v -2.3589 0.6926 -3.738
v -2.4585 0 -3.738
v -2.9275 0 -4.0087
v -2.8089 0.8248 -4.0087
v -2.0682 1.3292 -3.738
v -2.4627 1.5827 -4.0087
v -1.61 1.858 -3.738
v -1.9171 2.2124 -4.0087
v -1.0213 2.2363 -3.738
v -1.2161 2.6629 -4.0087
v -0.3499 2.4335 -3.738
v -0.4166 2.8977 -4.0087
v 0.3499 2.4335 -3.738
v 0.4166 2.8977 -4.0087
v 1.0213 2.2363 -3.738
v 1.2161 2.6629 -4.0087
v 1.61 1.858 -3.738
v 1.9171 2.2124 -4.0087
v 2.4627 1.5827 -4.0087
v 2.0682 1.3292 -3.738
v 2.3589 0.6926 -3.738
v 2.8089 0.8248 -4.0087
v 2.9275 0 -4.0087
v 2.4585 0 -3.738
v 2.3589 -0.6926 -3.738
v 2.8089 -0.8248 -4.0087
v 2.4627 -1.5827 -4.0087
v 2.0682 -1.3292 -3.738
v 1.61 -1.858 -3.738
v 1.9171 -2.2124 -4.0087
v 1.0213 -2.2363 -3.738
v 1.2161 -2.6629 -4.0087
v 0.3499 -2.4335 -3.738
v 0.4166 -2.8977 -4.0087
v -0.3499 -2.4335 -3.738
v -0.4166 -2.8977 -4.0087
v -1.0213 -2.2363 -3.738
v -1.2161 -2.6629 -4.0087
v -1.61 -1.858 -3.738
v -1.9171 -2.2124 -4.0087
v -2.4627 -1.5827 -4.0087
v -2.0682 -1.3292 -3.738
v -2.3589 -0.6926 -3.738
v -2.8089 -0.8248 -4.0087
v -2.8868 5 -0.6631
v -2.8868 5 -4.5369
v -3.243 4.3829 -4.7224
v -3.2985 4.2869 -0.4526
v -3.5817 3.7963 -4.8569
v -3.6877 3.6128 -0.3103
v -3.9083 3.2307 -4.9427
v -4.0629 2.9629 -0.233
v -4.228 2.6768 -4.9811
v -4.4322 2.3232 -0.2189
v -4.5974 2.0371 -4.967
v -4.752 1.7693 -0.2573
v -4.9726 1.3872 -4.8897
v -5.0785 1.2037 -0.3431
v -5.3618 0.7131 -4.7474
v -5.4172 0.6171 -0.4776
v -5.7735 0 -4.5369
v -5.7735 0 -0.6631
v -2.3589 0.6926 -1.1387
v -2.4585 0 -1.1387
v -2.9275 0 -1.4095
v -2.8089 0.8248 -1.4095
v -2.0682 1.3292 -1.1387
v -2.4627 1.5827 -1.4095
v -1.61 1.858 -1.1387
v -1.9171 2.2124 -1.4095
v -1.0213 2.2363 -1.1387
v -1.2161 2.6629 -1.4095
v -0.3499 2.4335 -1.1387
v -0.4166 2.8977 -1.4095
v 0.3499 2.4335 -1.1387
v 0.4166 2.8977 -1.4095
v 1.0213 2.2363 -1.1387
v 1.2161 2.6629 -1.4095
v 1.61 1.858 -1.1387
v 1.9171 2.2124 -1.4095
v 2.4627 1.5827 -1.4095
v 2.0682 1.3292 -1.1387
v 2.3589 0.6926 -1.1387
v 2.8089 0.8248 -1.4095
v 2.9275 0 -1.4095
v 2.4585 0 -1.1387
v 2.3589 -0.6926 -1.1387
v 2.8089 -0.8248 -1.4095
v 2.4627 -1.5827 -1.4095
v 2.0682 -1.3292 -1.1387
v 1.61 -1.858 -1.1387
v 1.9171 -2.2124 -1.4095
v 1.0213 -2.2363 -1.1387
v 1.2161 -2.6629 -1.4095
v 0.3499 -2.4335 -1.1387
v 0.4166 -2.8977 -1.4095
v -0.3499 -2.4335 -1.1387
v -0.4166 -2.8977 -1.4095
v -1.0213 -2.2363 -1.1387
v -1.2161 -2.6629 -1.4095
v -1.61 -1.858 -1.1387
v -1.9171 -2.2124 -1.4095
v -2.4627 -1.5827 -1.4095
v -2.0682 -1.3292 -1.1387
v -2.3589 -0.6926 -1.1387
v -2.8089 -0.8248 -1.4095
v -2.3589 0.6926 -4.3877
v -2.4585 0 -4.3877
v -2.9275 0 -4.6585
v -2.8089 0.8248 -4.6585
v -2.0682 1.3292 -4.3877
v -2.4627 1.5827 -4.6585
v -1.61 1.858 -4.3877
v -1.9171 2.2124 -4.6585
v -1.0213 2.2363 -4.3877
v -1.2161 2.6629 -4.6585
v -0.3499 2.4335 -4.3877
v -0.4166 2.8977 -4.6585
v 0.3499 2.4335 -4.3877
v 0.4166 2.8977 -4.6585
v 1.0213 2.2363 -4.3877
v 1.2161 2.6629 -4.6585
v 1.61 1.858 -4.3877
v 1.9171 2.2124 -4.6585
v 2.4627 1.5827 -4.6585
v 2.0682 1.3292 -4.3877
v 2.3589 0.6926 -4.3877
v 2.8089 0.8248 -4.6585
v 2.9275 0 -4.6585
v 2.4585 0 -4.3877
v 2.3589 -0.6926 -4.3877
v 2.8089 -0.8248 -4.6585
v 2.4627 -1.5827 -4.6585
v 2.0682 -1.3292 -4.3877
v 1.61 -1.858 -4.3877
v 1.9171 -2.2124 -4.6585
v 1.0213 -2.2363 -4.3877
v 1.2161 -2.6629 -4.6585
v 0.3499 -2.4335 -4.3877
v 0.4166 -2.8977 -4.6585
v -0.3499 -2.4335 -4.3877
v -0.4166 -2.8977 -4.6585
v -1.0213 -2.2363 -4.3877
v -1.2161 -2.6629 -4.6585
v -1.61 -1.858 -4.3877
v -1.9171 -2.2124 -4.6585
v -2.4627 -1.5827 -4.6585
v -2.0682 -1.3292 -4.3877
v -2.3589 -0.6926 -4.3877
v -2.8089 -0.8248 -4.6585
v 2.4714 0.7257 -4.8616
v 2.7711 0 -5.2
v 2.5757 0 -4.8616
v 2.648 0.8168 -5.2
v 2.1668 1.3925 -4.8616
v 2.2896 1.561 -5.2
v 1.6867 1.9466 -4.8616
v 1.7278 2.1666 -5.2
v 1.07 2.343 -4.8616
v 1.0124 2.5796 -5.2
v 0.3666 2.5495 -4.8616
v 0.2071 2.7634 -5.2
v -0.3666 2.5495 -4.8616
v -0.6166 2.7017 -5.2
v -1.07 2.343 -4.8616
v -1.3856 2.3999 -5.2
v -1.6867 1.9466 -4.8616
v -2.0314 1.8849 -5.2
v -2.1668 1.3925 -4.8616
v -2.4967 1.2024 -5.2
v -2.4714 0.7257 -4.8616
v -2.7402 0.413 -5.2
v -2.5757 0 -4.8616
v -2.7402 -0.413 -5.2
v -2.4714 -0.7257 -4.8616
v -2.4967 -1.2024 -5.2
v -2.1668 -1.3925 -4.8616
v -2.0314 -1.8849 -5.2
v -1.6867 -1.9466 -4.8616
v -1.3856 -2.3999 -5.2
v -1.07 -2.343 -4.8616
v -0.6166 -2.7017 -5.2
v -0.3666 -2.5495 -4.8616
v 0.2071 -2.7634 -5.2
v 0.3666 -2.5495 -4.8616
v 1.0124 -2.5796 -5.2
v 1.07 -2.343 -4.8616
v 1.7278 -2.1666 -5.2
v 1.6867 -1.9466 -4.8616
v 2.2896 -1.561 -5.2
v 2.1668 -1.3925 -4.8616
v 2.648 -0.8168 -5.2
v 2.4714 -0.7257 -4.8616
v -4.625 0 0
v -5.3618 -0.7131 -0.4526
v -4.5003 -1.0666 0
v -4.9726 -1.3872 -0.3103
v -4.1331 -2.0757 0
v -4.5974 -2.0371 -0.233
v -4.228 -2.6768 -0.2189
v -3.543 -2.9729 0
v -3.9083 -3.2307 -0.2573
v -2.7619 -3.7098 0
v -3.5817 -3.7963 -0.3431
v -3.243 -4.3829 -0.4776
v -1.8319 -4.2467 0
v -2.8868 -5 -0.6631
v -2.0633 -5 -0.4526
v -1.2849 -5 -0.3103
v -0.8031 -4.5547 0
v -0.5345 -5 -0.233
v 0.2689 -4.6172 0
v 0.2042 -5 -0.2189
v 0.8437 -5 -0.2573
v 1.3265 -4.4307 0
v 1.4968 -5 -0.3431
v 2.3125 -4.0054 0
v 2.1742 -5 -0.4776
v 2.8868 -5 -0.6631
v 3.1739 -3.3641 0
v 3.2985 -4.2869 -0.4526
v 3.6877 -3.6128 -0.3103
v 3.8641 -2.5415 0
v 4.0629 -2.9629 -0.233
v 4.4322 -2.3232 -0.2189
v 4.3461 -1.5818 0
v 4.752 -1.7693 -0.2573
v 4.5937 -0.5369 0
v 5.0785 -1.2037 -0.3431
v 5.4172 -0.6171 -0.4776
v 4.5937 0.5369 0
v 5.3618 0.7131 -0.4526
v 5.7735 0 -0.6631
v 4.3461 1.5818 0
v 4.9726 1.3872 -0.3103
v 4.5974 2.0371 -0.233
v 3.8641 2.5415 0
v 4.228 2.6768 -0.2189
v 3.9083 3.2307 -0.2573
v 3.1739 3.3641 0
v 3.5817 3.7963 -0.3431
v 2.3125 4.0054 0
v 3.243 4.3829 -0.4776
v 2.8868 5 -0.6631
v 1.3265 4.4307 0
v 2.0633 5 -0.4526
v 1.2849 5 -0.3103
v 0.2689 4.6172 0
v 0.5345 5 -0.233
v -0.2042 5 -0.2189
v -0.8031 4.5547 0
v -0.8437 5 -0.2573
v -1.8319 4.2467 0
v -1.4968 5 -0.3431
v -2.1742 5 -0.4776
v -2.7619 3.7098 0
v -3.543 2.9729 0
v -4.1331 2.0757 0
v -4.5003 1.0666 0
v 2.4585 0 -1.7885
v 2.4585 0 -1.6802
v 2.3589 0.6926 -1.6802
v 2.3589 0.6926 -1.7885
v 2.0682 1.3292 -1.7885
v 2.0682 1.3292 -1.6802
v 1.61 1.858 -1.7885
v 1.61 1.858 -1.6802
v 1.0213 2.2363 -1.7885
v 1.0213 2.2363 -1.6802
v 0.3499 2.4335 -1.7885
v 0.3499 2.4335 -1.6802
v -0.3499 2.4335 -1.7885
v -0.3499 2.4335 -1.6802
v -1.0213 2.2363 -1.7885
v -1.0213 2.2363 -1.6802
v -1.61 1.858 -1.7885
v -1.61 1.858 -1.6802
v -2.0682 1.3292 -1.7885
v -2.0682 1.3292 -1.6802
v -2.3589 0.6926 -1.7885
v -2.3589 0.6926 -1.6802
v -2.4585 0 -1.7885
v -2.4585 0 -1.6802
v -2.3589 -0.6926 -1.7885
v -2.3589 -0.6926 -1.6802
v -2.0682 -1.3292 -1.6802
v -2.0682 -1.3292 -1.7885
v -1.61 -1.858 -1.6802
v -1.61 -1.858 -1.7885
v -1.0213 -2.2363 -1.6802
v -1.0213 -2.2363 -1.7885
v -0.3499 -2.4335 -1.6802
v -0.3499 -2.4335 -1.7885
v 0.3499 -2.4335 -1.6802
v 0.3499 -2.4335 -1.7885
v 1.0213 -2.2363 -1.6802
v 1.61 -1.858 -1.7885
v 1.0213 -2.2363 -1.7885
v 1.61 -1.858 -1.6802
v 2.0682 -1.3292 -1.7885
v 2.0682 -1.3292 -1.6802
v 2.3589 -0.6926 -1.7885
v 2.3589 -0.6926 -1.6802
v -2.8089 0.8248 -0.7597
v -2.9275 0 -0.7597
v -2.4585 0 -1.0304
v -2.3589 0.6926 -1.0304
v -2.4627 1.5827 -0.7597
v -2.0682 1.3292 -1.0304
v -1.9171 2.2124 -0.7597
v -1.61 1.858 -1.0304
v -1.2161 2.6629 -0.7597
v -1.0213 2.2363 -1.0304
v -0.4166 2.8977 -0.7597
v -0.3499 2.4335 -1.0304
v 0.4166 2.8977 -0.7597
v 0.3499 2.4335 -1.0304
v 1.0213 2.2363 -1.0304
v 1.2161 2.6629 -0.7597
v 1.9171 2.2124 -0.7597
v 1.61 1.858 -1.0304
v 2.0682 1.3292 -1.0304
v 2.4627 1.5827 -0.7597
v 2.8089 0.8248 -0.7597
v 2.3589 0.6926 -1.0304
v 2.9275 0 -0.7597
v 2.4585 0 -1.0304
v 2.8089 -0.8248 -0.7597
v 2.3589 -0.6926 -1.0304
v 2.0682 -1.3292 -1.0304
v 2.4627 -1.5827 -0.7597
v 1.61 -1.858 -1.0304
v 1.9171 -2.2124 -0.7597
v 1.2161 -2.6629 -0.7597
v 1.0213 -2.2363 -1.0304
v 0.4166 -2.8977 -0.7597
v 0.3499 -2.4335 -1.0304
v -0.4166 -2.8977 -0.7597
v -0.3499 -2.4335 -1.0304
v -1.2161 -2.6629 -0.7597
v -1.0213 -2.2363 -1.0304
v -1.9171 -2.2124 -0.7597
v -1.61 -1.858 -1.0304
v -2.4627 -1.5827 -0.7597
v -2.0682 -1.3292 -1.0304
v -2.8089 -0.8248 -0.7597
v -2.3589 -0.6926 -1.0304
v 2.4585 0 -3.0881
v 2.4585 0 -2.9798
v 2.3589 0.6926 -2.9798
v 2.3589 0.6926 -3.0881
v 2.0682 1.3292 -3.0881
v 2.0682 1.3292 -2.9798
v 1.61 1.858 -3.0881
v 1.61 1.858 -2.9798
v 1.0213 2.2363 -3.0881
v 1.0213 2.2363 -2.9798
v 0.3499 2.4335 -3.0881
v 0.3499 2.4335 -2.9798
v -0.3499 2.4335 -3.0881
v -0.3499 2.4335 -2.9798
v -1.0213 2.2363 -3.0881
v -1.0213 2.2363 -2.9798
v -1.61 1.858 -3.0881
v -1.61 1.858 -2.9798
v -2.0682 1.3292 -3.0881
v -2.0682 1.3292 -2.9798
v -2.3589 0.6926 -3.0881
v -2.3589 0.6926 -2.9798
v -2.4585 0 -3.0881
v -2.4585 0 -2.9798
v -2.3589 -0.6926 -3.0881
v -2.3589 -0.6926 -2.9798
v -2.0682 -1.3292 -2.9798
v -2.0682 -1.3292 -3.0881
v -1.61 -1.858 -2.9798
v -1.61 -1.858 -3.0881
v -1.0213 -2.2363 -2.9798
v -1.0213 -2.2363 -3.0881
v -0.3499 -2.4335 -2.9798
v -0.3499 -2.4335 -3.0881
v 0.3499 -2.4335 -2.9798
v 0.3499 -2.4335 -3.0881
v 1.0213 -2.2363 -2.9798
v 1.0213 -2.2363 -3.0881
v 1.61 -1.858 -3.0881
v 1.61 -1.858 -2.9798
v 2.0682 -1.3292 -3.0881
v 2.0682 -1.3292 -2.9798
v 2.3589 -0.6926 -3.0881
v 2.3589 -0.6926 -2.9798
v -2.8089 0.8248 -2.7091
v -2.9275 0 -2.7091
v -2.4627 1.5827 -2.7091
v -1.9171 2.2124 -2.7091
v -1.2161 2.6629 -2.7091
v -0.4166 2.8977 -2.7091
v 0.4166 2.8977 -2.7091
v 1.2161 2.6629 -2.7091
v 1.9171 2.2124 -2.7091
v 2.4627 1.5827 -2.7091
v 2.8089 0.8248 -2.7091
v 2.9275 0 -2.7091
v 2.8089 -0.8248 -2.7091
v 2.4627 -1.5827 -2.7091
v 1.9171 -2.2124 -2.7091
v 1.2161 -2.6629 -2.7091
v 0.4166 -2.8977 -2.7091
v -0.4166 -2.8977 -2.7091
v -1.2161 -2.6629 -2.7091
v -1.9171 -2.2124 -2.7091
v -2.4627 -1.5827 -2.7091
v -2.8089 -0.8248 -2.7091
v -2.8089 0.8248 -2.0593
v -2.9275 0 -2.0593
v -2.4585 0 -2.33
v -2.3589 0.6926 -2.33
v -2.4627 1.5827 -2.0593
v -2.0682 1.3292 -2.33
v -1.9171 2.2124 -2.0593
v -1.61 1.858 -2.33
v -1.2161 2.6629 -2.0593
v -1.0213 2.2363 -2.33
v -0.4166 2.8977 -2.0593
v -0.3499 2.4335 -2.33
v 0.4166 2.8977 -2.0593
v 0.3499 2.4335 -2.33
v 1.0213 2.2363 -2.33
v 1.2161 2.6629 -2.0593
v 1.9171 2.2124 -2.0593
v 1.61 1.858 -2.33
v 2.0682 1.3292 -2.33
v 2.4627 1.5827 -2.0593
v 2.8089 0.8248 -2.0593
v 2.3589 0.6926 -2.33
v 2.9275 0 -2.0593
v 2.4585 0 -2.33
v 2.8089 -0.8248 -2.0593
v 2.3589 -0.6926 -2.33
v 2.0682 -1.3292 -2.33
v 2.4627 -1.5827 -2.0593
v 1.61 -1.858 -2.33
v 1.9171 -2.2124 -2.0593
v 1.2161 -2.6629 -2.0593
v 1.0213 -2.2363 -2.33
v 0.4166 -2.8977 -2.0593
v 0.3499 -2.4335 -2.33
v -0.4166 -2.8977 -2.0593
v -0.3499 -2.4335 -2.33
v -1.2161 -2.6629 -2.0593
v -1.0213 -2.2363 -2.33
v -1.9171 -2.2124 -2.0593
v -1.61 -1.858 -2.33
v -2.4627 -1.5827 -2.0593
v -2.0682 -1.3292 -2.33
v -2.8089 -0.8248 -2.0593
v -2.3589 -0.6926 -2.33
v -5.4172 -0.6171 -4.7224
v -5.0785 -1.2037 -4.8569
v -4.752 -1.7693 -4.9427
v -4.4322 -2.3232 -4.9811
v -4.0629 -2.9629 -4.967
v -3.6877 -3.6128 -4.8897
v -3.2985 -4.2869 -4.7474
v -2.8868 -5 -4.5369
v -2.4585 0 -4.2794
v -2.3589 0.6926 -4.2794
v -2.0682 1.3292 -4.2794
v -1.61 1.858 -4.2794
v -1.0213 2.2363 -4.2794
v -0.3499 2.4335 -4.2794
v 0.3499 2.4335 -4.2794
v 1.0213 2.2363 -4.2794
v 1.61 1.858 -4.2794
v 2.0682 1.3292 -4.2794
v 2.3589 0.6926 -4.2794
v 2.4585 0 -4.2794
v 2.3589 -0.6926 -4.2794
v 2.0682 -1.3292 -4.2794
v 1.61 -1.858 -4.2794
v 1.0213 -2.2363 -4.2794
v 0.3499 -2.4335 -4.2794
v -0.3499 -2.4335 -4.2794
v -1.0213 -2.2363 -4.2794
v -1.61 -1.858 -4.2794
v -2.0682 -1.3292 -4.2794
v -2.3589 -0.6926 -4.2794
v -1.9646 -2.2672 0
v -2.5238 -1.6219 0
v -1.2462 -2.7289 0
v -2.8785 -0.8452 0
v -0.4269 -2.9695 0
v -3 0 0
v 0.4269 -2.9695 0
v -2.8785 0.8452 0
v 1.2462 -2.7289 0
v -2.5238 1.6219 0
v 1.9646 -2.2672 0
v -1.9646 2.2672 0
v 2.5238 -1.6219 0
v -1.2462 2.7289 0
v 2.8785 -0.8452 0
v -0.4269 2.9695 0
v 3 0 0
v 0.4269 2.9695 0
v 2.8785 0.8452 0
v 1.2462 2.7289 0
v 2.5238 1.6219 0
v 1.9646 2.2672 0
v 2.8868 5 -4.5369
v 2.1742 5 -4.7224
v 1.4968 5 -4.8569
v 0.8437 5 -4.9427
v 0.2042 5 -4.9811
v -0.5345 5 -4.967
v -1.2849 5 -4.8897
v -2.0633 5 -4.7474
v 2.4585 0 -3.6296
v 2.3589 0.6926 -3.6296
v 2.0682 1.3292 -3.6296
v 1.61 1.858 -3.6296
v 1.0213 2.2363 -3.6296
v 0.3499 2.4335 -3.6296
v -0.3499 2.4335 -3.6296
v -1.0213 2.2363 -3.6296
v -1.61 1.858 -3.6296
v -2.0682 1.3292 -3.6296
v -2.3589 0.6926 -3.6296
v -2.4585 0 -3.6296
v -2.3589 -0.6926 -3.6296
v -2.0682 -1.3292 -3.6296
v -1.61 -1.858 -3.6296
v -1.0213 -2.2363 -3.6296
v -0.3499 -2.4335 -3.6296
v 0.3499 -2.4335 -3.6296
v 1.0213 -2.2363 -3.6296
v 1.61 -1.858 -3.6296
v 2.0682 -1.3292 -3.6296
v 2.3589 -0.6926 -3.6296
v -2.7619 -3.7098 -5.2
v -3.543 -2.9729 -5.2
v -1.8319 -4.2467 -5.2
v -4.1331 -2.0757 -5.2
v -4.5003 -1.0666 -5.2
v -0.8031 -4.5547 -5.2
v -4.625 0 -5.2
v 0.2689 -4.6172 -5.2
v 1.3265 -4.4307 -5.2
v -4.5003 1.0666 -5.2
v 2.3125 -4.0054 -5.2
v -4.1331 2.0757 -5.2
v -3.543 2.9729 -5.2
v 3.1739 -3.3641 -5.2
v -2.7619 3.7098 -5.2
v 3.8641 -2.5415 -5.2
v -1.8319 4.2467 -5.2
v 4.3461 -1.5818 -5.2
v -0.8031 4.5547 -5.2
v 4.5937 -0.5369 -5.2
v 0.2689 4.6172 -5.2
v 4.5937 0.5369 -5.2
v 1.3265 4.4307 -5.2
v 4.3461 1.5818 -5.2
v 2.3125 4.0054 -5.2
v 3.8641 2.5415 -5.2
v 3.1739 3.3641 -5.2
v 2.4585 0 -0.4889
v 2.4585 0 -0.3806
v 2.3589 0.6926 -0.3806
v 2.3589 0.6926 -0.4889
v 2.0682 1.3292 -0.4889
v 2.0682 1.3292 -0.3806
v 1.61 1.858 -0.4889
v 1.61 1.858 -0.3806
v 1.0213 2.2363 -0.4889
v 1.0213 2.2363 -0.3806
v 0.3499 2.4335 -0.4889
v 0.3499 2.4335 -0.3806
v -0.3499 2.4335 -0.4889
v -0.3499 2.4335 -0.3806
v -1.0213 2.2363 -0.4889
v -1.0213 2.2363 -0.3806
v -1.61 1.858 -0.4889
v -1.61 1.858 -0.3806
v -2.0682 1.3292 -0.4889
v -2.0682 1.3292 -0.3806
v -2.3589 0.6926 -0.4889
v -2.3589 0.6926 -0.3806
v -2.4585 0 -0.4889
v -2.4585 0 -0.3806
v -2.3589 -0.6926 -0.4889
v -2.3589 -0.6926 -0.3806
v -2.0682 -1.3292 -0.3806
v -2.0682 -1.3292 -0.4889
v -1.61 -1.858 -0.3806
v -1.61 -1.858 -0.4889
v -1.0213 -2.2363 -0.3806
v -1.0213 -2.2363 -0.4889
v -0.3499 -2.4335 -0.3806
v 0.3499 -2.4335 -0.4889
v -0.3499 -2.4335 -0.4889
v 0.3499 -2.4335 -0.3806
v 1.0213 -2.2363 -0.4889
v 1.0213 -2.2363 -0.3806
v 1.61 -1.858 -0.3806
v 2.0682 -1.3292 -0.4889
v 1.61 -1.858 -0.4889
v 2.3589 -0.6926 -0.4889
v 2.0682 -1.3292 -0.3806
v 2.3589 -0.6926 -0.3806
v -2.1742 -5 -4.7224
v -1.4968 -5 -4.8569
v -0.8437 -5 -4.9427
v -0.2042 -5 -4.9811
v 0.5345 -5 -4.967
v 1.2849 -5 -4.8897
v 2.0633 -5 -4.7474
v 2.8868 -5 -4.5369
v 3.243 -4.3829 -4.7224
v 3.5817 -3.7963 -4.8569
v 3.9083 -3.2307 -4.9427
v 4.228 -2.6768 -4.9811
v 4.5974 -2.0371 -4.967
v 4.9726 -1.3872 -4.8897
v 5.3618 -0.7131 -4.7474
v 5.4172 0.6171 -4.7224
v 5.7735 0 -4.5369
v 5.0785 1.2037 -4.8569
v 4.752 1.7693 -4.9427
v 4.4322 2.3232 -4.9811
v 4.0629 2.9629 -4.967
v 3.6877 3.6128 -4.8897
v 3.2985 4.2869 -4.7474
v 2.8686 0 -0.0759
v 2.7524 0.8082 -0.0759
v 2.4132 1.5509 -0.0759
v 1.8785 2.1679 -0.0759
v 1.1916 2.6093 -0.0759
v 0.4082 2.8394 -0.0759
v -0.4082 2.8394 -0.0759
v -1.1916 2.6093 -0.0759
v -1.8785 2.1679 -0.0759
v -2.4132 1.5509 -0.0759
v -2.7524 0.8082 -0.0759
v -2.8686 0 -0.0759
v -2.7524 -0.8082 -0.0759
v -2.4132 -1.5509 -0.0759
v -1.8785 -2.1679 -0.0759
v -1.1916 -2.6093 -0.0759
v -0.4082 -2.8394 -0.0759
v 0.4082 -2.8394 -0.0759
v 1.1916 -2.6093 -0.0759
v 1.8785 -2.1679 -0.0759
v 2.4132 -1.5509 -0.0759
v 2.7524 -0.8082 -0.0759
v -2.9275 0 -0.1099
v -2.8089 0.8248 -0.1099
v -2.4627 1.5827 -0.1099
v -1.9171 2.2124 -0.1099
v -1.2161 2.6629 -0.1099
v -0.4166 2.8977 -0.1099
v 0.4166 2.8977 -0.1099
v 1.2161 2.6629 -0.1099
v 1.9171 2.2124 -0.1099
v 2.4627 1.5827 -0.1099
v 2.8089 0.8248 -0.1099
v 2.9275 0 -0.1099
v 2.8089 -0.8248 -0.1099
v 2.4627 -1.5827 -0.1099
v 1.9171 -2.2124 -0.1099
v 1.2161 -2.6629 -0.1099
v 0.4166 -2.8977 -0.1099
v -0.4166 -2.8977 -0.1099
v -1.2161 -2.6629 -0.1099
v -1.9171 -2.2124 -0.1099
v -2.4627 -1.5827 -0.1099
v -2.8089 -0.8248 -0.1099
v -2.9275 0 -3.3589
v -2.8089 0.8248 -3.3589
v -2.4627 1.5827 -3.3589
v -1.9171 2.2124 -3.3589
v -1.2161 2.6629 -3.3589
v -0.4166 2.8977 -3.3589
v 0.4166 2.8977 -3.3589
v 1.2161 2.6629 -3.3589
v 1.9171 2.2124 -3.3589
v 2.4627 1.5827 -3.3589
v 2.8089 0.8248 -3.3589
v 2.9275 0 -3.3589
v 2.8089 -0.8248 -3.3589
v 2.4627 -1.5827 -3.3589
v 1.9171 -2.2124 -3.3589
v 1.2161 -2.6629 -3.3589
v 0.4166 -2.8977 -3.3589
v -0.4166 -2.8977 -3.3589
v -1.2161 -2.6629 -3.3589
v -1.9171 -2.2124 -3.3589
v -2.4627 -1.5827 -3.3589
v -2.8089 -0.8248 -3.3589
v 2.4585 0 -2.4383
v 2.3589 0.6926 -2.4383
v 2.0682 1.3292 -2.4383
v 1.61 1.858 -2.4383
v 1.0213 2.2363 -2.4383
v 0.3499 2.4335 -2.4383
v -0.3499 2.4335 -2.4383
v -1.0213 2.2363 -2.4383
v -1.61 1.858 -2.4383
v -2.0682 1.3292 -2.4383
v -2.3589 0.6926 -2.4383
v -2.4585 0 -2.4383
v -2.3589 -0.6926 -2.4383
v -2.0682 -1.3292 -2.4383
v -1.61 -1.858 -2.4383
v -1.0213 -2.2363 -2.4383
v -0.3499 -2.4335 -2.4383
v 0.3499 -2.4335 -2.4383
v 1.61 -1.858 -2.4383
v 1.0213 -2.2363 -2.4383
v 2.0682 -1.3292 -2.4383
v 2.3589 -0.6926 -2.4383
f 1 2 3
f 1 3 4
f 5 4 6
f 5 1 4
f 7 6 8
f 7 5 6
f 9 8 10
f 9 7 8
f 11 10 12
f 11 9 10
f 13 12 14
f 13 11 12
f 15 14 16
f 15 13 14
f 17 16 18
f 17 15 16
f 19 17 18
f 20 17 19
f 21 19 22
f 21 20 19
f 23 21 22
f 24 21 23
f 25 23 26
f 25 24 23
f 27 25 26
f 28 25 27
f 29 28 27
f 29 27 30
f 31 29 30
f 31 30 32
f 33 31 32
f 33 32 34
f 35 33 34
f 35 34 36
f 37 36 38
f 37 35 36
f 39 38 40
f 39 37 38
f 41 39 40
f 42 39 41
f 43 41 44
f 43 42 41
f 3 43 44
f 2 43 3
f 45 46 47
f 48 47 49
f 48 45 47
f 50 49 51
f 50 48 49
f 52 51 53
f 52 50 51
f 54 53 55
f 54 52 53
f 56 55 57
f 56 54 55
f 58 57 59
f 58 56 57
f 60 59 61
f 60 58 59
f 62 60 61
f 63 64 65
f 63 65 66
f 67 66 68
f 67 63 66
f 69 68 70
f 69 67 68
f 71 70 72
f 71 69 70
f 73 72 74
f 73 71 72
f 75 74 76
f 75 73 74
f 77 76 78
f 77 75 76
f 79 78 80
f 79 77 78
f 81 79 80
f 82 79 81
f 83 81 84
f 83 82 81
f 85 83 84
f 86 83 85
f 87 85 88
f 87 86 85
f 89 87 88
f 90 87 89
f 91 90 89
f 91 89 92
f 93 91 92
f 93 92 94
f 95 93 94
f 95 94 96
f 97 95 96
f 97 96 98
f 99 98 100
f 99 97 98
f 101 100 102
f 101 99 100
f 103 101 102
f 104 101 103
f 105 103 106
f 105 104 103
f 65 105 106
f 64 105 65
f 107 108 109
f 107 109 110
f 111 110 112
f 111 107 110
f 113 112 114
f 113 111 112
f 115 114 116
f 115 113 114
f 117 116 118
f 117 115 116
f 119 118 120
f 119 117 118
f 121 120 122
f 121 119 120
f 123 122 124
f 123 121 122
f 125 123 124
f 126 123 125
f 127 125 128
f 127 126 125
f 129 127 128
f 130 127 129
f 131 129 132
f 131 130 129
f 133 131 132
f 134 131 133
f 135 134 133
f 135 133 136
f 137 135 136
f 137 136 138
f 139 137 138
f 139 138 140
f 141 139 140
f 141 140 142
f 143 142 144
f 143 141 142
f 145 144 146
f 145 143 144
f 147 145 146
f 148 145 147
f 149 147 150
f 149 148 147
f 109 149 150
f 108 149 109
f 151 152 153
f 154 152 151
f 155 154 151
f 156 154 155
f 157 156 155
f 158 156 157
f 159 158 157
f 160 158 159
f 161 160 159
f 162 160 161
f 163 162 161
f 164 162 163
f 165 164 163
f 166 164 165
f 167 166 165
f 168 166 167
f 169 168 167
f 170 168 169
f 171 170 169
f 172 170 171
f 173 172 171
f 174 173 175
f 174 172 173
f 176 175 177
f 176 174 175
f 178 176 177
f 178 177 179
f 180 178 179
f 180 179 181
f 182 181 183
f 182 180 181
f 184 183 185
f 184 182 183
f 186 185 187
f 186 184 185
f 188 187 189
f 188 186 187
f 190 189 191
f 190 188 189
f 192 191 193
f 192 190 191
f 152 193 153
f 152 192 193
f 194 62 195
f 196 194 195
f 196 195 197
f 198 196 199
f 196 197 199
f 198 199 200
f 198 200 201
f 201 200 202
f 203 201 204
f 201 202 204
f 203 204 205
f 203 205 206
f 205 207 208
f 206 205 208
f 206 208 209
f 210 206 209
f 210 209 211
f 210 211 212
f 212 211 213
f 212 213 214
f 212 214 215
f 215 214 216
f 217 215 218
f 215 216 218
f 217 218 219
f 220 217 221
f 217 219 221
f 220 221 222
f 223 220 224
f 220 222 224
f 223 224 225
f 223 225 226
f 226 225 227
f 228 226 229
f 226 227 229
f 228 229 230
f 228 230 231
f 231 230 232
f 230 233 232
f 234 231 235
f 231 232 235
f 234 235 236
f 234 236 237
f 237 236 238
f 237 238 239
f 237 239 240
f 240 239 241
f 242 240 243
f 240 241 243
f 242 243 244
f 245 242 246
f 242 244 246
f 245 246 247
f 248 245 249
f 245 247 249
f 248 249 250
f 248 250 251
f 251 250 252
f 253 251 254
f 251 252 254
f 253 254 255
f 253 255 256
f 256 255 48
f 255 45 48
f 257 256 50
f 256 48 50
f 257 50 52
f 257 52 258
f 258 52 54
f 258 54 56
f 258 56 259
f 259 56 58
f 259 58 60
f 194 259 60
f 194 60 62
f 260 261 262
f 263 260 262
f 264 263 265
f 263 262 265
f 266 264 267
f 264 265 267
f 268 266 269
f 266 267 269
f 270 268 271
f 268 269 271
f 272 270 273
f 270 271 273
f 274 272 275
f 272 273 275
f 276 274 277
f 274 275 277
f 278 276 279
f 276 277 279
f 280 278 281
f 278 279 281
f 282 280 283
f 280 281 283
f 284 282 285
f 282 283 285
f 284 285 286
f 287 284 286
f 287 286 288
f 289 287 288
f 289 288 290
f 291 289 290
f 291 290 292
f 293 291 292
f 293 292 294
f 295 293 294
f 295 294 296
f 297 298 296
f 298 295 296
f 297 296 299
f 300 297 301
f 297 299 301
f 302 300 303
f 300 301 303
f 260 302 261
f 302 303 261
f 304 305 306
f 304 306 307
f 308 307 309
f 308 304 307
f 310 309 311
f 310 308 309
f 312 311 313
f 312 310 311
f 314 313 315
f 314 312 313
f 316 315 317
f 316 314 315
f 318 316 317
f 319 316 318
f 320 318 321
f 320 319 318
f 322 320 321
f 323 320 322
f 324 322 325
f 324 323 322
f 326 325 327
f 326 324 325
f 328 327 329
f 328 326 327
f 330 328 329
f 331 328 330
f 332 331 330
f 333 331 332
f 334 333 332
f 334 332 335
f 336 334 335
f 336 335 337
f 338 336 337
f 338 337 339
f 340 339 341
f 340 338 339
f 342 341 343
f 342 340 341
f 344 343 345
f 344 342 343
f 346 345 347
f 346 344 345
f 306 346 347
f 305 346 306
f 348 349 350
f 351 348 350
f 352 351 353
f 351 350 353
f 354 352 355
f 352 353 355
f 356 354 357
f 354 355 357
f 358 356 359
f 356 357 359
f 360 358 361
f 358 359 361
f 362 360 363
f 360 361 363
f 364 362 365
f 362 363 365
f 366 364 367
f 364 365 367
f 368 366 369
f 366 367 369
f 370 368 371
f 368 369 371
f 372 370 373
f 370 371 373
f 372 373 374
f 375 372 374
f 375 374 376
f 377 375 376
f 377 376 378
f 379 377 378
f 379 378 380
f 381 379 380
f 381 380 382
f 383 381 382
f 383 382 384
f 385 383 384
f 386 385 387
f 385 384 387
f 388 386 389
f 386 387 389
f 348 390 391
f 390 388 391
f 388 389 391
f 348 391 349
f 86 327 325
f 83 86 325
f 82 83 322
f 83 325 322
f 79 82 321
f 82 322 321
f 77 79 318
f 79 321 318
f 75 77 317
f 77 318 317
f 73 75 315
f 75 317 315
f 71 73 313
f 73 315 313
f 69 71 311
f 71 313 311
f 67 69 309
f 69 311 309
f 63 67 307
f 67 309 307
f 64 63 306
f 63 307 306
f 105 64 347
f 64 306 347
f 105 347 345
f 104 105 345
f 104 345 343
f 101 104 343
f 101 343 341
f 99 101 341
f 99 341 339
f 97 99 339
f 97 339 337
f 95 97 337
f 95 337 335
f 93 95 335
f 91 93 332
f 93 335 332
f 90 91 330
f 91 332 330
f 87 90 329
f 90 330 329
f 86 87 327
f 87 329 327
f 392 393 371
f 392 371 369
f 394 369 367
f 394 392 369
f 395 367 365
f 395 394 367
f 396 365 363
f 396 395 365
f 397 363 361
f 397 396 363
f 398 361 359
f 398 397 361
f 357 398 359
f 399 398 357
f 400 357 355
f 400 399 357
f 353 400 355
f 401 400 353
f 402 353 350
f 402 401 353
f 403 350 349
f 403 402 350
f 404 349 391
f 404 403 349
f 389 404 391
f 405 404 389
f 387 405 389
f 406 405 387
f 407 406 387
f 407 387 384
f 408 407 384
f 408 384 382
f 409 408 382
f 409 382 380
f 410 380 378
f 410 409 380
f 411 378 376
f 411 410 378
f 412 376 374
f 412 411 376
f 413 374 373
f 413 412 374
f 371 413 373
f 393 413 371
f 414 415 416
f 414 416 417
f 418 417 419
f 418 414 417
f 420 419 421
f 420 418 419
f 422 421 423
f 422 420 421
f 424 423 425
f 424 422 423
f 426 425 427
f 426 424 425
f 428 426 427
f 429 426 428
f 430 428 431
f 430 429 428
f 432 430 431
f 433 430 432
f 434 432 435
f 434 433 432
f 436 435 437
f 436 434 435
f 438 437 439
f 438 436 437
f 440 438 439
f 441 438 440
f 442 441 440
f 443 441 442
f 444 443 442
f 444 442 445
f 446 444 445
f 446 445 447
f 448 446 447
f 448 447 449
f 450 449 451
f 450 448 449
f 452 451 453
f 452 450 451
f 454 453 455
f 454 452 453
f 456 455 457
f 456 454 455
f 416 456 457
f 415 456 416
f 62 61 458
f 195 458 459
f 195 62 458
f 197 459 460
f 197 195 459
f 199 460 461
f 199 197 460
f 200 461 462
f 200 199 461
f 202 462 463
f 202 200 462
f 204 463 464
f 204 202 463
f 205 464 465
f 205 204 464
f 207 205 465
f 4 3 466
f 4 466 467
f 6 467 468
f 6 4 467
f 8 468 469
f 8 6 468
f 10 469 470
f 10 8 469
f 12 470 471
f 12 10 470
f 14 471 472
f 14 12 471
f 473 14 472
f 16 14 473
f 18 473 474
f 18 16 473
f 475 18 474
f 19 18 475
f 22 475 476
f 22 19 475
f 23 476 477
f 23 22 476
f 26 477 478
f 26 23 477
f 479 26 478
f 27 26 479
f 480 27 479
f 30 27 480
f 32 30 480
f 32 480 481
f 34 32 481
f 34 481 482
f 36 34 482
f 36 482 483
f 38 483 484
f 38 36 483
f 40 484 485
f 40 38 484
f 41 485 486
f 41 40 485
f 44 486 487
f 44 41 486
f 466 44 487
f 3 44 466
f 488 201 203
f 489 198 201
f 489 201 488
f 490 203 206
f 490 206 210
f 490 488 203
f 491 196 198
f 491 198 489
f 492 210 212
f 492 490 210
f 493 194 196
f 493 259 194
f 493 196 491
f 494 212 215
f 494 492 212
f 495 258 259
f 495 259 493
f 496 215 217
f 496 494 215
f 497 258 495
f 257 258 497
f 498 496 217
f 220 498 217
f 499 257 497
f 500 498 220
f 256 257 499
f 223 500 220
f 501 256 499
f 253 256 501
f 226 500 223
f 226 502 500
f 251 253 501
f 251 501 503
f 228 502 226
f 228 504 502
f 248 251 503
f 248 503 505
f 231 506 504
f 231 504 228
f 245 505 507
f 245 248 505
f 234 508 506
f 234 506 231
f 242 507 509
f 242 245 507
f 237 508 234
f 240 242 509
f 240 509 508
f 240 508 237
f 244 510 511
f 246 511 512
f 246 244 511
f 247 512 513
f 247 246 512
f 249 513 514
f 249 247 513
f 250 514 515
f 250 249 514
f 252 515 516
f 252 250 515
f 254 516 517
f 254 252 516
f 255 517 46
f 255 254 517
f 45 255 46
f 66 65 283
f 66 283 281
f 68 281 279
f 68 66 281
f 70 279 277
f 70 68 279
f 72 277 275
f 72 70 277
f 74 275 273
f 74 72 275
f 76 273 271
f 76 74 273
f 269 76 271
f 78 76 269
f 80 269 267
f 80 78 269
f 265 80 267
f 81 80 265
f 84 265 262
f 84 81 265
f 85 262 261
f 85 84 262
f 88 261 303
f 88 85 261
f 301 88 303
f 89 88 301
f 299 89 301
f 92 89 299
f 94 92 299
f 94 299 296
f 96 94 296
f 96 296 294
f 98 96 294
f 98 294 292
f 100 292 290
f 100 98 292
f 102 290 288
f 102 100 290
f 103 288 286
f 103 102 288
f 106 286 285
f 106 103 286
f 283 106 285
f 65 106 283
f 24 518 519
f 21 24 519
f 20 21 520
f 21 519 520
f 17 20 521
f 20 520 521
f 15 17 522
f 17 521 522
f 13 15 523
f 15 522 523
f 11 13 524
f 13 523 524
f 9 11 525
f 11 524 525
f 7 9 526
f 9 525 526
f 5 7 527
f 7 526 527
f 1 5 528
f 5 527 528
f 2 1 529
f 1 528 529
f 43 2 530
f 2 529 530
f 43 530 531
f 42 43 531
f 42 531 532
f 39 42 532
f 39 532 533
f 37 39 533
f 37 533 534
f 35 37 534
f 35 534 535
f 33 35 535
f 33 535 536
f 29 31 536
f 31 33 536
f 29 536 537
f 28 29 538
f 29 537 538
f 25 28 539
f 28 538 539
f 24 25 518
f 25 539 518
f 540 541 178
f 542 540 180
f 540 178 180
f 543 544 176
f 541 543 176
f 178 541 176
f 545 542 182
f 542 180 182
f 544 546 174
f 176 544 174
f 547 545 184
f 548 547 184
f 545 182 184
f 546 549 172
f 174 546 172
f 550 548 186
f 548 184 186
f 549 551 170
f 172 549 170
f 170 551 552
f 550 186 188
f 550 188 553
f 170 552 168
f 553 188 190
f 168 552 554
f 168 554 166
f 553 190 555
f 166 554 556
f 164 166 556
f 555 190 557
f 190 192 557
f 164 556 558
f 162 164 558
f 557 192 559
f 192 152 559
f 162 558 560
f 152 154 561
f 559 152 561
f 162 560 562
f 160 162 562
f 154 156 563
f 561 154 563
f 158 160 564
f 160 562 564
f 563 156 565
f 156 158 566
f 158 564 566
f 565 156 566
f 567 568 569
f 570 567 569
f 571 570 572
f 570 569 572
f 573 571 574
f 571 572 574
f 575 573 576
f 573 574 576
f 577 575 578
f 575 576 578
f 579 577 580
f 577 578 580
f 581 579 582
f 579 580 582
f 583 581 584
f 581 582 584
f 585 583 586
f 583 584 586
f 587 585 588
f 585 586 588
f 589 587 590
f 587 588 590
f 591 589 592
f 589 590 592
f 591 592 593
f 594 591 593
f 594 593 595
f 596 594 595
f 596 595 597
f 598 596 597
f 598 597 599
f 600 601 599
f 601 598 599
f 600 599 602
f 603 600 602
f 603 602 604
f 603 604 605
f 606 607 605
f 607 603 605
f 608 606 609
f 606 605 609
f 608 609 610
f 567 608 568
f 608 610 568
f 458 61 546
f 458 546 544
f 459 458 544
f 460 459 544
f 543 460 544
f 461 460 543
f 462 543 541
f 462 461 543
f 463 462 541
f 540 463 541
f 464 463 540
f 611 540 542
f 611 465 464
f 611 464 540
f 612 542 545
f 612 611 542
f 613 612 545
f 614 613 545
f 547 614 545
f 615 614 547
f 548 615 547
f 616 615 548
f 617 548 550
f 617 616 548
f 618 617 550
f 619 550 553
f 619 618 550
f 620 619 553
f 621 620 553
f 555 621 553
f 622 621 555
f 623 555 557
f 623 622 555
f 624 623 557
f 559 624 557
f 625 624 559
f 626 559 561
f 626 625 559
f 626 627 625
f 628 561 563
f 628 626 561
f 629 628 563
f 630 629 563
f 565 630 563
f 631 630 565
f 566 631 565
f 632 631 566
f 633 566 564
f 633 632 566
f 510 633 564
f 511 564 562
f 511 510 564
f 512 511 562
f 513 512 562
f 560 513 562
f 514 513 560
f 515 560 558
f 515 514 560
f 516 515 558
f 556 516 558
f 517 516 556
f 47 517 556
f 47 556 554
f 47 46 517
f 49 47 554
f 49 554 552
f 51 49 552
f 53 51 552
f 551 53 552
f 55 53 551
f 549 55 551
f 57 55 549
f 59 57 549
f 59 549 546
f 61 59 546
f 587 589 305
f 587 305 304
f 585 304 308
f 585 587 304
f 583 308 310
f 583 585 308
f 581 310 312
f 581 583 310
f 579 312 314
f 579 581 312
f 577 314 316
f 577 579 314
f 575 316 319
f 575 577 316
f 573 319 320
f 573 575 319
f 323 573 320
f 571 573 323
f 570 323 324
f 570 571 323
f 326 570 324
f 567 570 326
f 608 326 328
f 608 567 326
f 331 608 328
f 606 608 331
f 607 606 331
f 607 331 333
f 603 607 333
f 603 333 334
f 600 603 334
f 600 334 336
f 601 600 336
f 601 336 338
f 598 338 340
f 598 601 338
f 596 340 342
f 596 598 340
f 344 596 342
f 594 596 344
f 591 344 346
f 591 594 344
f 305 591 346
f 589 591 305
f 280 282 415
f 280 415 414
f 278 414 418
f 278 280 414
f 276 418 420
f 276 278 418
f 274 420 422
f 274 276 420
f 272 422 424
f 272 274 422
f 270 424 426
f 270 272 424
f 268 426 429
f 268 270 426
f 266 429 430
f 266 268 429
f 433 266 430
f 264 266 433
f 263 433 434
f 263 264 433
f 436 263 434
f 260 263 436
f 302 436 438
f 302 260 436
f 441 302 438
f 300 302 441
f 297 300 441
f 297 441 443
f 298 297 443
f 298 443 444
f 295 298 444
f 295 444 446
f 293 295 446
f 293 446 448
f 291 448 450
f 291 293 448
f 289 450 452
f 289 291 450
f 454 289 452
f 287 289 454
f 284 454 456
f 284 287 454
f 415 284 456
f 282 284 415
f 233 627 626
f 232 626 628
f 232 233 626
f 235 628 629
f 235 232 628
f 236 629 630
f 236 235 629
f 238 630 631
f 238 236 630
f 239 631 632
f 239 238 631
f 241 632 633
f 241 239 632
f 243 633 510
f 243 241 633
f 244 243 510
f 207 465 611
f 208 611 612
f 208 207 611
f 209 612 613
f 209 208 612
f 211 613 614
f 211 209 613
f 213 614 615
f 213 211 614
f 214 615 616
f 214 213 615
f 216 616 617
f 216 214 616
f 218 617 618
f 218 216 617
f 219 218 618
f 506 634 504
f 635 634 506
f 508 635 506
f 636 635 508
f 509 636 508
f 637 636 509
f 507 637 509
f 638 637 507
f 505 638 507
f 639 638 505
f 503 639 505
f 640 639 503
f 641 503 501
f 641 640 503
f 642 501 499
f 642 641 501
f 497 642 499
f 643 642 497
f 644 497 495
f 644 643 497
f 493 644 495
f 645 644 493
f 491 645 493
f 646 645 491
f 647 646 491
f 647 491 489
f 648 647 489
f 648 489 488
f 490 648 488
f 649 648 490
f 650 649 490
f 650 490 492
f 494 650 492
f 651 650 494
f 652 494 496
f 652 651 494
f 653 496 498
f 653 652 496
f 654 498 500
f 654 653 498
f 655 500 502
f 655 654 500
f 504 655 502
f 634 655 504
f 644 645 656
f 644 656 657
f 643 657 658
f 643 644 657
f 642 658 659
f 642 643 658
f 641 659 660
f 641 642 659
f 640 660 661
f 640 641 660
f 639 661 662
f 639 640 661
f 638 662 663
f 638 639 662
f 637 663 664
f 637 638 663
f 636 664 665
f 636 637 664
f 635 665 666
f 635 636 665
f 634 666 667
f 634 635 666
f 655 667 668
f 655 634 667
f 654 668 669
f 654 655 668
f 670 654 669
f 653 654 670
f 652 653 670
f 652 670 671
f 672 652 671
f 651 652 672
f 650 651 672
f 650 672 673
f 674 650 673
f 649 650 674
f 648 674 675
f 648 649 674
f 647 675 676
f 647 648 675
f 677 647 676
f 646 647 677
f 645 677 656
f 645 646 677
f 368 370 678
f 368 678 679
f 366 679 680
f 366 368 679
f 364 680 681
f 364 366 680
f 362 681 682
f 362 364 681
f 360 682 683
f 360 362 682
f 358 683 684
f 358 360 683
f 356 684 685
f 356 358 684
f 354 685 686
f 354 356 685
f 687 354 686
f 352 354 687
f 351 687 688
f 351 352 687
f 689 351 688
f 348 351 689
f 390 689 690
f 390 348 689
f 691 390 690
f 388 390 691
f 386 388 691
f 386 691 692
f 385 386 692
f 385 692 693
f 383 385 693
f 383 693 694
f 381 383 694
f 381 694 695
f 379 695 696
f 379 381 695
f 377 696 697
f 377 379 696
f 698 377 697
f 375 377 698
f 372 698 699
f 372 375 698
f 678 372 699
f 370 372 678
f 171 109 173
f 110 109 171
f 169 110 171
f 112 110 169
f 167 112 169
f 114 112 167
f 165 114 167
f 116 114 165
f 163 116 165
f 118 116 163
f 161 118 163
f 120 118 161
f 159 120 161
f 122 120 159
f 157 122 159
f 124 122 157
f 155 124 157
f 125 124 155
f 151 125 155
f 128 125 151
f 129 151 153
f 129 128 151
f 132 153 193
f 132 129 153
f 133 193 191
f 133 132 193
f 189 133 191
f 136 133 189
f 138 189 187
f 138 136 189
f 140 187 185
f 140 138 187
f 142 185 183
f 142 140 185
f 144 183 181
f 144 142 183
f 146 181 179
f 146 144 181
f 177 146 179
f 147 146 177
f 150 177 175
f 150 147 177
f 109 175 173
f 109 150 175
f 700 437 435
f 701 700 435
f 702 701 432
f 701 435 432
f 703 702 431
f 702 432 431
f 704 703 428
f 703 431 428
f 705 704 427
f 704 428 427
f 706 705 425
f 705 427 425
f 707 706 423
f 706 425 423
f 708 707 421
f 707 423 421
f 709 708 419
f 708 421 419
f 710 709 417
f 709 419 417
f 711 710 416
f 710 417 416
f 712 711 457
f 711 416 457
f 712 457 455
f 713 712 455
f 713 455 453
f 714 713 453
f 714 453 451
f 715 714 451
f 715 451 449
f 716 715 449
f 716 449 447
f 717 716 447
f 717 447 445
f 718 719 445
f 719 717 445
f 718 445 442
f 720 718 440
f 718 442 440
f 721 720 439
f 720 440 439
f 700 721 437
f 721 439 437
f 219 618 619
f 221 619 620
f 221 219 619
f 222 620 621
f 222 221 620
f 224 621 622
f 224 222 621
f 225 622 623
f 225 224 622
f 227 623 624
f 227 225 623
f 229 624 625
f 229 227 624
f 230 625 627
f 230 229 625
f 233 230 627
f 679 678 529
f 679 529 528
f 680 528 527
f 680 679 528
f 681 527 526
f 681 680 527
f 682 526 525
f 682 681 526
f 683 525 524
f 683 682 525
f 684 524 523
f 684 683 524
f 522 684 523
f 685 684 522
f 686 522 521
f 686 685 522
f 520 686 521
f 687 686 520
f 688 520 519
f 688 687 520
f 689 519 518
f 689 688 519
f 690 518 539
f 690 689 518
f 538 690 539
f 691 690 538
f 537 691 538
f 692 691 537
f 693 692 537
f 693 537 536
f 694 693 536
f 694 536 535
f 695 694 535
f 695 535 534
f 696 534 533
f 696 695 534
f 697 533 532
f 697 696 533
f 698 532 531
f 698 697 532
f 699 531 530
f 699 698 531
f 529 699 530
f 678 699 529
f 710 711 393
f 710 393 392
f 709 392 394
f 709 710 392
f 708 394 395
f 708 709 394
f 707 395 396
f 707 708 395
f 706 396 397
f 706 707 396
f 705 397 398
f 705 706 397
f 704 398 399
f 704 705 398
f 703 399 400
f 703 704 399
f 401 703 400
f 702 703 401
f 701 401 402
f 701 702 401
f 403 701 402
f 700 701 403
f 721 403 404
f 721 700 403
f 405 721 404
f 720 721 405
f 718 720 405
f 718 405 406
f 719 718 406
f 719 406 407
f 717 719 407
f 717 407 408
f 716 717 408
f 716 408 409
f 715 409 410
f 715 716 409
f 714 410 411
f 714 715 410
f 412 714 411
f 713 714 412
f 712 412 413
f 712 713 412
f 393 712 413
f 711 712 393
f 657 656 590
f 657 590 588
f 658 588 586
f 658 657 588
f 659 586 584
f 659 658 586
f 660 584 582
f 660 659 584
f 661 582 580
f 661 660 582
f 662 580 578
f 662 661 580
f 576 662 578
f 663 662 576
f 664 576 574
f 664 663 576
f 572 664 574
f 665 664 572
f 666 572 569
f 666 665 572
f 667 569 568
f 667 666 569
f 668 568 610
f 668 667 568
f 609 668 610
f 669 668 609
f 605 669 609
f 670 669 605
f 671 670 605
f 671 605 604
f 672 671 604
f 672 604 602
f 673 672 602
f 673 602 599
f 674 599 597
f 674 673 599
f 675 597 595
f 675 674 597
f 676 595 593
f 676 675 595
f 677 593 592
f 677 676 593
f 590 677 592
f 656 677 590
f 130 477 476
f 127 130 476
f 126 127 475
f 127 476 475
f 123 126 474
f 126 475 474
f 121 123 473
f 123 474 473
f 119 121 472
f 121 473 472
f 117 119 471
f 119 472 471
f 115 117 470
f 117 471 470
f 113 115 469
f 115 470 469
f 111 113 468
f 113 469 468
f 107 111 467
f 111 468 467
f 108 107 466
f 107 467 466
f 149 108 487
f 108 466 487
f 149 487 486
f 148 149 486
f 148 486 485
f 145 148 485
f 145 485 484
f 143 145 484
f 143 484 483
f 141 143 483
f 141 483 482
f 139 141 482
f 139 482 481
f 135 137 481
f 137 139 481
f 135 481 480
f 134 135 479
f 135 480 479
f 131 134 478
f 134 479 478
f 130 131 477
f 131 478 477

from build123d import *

# Parameters (mm, degrees)
SKETCH1_R               = 2.4585
BASENUT_DEPTH           = 5.2
ENDCHAMFER_SIZE         = 0.5415
ENDCHAMFER_SIZE2        = 0.312635171
ENDCHAMFER_PART_2_SIZE  = 0.5415
ENDCHAMFER_PART_2_SIZE2 = 0.312635171
LPATTERN10_COUNT        = 8
LPATTERN10_PITCH        = 0.6498


with BuildPart() as part:
    # Sketch1 → BaseNut (new body)
    with BuildSketch(Plane.XY):
        Polygon((5.773502692, 0), (2.886751346, 5), (-2.886751346, 5), (-5.773502692, 0), (-2.886751346, -5), (2.886751346, -5), align=None)
        Circle(SKETCH1_R, mode=Mode.SUBTRACT)
    extrude(amount=-BASENUT_DEPTH)

    # Sketch2 → Double-Chamfer (revolve, cut)
    with BuildSketch(Plane(origin=(0, 0, 0), x_dir=(1, 0, 0), z_dir=(0, 1, 0))):
        Polygon((-5.773502692, 5.2), (-4.625, 5.2), (-5.773502692, 4.536911662), align=None)
        Polygon((-5.773502692, 0.663088338), (-5.773502692, 0), (-4.625, 0), align=None)
    revolve(axis=Axis((0, 0, -3.375940562), (0, 0, 1)), mode=Mode.SUBTRACT)

    # EndChamfer
    endchamfer_edges = [part.edges().sort_by_distance(p)[0] for p in [
        (-2.4585, 0, -5.2),
    ]]
    endchamfer_side = [part.faces().sort_by_distance(p)[0] for p in [
        (-2.4585, 0, -2.6),
    ]]
    chamfer(endchamfer_edges, length=ENDCHAMFER_SIZE, length2=ENDCHAMFER_SIZE2, reference=endchamfer_side[0])

    # EndChamfer part 2
    endchamfer_part_2_edges = [part.edges().sort_by_distance(p)[0] for p in [
        (-2.4585, 0, 0),
    ]]
    endchamfer_part_2_side = [part.faces().sort_by_distance(p)[0] for p in [
        (4.494185245, 0, 0),
    ]]
    chamfer(endchamfer_part_2_edges, length=ENDCHAMFER_PART_2_SIZE, length2=ENDCHAMFER_PART_2_SIZE2, reference=endchamfer_part_2_side[0])

    # Sketch3 → Cut-Revolve10 (revolve, cut)
    with BuildSketch(Plane(origin=(0, 0, 0), x_dir=(1, 0, 0), z_dir=(0, 1, 0))):
        Polygon((-2.927452756, 4.6585), (-2.4585, 4.38775), (-1.917, 4.38775), (-1.917, 4.92925), (-2.4585, 4.92925), align=None)
    cut_revolve10 = revolve(axis=Axis((0, 0, -7.438254559), (0, 0, -1)), mode=Mode.SUBTRACT)

    # LPattern10: Cut-Revolve10 ×8
    with Locations(*[(0, 0, i * LPATTERN10_PITCH) for i in range(1, LPATTERN10_COUNT)]):
        add(cut_revolve10, mode=Mode.SUBTRACT)


solid = part.part
